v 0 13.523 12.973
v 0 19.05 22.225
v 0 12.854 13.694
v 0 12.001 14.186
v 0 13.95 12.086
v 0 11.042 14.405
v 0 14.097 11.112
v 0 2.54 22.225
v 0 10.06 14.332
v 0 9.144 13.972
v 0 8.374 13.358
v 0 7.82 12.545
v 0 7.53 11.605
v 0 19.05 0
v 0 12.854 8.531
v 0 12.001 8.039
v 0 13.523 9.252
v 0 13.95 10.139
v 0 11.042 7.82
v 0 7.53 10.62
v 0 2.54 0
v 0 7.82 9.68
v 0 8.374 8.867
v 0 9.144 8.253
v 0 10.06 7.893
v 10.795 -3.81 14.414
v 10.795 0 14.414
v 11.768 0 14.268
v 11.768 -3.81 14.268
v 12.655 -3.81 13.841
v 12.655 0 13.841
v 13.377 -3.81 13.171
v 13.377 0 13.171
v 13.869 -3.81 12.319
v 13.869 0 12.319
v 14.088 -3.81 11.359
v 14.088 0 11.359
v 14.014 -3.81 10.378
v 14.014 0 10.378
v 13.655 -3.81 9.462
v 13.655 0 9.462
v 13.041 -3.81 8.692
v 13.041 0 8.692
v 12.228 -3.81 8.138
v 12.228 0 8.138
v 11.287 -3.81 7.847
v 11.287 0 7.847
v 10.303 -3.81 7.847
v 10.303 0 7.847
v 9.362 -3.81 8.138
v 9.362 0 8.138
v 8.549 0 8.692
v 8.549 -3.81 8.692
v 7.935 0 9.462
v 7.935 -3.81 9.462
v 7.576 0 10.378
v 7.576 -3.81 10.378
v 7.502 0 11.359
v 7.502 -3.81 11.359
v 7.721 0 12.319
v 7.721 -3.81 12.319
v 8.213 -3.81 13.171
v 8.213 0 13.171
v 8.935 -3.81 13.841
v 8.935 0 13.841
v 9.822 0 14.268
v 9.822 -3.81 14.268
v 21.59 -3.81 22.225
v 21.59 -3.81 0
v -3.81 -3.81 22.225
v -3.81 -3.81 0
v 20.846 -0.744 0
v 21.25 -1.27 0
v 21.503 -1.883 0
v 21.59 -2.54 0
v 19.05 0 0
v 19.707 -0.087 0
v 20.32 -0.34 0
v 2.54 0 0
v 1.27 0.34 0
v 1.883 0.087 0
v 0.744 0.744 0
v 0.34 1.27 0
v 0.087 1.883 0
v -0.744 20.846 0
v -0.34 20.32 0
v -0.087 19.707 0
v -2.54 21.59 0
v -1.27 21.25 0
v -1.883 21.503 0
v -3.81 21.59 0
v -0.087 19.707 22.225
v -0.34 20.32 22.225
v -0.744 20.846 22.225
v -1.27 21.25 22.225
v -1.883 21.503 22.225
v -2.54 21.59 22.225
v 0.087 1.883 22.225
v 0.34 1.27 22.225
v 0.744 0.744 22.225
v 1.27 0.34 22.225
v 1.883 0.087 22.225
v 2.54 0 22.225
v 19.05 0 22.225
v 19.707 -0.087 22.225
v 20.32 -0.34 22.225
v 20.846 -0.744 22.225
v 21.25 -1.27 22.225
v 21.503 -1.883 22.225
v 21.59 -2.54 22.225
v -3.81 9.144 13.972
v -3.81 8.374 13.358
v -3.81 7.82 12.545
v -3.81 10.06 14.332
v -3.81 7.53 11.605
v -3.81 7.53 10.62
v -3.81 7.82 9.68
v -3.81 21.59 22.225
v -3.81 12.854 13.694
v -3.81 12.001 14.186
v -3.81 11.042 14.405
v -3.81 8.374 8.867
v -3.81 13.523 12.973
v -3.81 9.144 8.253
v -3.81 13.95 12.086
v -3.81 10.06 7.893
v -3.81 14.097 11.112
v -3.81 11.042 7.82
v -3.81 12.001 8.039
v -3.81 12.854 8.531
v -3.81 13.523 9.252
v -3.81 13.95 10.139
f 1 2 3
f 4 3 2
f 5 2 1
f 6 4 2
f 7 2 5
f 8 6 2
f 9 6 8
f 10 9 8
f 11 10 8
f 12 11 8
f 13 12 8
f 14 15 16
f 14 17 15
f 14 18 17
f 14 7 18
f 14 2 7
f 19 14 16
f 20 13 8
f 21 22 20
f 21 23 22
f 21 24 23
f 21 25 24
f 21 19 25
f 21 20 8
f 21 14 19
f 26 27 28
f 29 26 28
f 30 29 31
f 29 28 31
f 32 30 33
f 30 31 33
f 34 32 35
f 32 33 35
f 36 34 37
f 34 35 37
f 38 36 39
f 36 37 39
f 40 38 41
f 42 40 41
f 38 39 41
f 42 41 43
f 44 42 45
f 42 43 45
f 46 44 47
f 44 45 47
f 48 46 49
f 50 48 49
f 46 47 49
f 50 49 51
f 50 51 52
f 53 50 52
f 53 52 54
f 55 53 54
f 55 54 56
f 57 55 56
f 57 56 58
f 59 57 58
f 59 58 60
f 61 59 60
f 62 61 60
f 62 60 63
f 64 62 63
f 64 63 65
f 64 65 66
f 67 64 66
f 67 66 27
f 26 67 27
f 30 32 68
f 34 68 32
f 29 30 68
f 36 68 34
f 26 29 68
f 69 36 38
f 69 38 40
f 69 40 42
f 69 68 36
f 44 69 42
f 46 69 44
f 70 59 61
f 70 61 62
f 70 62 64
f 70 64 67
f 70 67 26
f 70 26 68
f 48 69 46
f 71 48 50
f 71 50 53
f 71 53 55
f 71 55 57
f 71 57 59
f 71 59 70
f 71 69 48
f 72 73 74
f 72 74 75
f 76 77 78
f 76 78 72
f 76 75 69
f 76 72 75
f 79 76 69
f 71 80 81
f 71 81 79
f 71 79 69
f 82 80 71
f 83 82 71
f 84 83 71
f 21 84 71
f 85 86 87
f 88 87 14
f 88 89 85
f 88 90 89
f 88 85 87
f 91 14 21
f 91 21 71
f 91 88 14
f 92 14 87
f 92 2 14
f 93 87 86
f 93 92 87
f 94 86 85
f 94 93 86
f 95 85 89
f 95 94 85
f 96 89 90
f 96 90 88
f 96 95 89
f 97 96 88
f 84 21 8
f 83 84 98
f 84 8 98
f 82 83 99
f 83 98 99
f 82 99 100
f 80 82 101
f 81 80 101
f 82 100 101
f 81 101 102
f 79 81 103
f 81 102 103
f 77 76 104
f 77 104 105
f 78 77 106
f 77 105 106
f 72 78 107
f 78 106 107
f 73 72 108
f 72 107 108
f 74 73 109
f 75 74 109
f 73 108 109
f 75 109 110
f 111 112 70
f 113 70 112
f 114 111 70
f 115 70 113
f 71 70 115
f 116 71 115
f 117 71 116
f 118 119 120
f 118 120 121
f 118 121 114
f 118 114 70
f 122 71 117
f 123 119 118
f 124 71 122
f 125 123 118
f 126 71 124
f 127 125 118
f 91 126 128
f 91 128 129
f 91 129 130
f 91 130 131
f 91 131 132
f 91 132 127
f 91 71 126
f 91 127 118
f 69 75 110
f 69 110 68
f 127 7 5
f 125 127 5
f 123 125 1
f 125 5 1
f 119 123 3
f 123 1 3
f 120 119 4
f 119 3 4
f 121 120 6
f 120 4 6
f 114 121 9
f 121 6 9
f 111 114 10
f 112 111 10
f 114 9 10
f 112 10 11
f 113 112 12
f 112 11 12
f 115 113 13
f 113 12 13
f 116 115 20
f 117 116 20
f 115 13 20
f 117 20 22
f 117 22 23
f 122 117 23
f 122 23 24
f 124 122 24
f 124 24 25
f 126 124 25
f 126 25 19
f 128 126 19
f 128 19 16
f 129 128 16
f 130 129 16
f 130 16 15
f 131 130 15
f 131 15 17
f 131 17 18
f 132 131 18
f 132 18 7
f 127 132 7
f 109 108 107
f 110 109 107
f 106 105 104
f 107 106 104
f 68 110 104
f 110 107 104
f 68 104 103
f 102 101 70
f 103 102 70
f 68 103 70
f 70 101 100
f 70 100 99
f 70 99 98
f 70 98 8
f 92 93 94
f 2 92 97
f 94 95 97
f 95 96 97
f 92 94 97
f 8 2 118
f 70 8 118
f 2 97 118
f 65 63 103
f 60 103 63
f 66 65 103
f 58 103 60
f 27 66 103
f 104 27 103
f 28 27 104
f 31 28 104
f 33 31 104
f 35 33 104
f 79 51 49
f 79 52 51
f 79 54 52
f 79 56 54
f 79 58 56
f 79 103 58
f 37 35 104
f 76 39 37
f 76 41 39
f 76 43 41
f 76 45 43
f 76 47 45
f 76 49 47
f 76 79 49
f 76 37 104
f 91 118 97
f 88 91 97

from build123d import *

# Parameters (mm, degrees)
BOSS_EXTRUDE1_DEPTH = 22.225
SKETCH2_R           = 3.302
CUT_EXTRUDE1_DEPTH  = 38.765153581
SKETCH3_R           = 3.302
CUT_EXTRUDE2_DEPTH  = 38.765153581
FILLET1_R           = 2.54


with BuildPart() as part:
    # Sketch1 → Boss-Extrude1 (new body)
    with BuildSketch(Plane.XY):
        Polygon((0, 21.59), (0, 0), (21.59, 0), (21.59, -3.81), (-3.81, -3.81), (-3.81, 21.59), align=None)
    extrude(amount=BOSS_EXTRUDE1_DEPTH)

    # Sketch2 → Cut-Extrude1 (cut, through all)
    with BuildSketch(Plane(origin=(0, 0, 0), x_dir=(1, 0, 0), z_dir=(0, 1, 0))):
        with Locations(Location((10.795, -11.1125, 0), (0, 0, 270))):
            Circle(SKETCH2_R)
    extrude(amount=-CUT_EXTRUDE1_DEPTH, mode=Mode.SUBTRACT)

    # Sketch3 → Cut-Extrude2 (cut, through all)
    with BuildSketch(Plane(origin=(0, 0, 0), x_dir=(0, 0, -1), z_dir=(1, 0, 0))):
        with Locations(Location((-11.1125, 10.795, 0), (0, 0, 90))):
            Circle(SKETCH3_R)
    extrude(amount=-CUT_EXTRUDE2_DEPTH, mode=Mode.SUBTRACT)

    # Fillet1
    fillet1_edges = [part.edges().sort_by_distance(p)[0] for p in [
        (0, 21.59, 11.1125),
        (0, 0, 11.1125),
        (21.59, 0, 11.1125),
    ]]
    fillet(fillet1_edges, radius=FILLET1_R)


solid = part.part
